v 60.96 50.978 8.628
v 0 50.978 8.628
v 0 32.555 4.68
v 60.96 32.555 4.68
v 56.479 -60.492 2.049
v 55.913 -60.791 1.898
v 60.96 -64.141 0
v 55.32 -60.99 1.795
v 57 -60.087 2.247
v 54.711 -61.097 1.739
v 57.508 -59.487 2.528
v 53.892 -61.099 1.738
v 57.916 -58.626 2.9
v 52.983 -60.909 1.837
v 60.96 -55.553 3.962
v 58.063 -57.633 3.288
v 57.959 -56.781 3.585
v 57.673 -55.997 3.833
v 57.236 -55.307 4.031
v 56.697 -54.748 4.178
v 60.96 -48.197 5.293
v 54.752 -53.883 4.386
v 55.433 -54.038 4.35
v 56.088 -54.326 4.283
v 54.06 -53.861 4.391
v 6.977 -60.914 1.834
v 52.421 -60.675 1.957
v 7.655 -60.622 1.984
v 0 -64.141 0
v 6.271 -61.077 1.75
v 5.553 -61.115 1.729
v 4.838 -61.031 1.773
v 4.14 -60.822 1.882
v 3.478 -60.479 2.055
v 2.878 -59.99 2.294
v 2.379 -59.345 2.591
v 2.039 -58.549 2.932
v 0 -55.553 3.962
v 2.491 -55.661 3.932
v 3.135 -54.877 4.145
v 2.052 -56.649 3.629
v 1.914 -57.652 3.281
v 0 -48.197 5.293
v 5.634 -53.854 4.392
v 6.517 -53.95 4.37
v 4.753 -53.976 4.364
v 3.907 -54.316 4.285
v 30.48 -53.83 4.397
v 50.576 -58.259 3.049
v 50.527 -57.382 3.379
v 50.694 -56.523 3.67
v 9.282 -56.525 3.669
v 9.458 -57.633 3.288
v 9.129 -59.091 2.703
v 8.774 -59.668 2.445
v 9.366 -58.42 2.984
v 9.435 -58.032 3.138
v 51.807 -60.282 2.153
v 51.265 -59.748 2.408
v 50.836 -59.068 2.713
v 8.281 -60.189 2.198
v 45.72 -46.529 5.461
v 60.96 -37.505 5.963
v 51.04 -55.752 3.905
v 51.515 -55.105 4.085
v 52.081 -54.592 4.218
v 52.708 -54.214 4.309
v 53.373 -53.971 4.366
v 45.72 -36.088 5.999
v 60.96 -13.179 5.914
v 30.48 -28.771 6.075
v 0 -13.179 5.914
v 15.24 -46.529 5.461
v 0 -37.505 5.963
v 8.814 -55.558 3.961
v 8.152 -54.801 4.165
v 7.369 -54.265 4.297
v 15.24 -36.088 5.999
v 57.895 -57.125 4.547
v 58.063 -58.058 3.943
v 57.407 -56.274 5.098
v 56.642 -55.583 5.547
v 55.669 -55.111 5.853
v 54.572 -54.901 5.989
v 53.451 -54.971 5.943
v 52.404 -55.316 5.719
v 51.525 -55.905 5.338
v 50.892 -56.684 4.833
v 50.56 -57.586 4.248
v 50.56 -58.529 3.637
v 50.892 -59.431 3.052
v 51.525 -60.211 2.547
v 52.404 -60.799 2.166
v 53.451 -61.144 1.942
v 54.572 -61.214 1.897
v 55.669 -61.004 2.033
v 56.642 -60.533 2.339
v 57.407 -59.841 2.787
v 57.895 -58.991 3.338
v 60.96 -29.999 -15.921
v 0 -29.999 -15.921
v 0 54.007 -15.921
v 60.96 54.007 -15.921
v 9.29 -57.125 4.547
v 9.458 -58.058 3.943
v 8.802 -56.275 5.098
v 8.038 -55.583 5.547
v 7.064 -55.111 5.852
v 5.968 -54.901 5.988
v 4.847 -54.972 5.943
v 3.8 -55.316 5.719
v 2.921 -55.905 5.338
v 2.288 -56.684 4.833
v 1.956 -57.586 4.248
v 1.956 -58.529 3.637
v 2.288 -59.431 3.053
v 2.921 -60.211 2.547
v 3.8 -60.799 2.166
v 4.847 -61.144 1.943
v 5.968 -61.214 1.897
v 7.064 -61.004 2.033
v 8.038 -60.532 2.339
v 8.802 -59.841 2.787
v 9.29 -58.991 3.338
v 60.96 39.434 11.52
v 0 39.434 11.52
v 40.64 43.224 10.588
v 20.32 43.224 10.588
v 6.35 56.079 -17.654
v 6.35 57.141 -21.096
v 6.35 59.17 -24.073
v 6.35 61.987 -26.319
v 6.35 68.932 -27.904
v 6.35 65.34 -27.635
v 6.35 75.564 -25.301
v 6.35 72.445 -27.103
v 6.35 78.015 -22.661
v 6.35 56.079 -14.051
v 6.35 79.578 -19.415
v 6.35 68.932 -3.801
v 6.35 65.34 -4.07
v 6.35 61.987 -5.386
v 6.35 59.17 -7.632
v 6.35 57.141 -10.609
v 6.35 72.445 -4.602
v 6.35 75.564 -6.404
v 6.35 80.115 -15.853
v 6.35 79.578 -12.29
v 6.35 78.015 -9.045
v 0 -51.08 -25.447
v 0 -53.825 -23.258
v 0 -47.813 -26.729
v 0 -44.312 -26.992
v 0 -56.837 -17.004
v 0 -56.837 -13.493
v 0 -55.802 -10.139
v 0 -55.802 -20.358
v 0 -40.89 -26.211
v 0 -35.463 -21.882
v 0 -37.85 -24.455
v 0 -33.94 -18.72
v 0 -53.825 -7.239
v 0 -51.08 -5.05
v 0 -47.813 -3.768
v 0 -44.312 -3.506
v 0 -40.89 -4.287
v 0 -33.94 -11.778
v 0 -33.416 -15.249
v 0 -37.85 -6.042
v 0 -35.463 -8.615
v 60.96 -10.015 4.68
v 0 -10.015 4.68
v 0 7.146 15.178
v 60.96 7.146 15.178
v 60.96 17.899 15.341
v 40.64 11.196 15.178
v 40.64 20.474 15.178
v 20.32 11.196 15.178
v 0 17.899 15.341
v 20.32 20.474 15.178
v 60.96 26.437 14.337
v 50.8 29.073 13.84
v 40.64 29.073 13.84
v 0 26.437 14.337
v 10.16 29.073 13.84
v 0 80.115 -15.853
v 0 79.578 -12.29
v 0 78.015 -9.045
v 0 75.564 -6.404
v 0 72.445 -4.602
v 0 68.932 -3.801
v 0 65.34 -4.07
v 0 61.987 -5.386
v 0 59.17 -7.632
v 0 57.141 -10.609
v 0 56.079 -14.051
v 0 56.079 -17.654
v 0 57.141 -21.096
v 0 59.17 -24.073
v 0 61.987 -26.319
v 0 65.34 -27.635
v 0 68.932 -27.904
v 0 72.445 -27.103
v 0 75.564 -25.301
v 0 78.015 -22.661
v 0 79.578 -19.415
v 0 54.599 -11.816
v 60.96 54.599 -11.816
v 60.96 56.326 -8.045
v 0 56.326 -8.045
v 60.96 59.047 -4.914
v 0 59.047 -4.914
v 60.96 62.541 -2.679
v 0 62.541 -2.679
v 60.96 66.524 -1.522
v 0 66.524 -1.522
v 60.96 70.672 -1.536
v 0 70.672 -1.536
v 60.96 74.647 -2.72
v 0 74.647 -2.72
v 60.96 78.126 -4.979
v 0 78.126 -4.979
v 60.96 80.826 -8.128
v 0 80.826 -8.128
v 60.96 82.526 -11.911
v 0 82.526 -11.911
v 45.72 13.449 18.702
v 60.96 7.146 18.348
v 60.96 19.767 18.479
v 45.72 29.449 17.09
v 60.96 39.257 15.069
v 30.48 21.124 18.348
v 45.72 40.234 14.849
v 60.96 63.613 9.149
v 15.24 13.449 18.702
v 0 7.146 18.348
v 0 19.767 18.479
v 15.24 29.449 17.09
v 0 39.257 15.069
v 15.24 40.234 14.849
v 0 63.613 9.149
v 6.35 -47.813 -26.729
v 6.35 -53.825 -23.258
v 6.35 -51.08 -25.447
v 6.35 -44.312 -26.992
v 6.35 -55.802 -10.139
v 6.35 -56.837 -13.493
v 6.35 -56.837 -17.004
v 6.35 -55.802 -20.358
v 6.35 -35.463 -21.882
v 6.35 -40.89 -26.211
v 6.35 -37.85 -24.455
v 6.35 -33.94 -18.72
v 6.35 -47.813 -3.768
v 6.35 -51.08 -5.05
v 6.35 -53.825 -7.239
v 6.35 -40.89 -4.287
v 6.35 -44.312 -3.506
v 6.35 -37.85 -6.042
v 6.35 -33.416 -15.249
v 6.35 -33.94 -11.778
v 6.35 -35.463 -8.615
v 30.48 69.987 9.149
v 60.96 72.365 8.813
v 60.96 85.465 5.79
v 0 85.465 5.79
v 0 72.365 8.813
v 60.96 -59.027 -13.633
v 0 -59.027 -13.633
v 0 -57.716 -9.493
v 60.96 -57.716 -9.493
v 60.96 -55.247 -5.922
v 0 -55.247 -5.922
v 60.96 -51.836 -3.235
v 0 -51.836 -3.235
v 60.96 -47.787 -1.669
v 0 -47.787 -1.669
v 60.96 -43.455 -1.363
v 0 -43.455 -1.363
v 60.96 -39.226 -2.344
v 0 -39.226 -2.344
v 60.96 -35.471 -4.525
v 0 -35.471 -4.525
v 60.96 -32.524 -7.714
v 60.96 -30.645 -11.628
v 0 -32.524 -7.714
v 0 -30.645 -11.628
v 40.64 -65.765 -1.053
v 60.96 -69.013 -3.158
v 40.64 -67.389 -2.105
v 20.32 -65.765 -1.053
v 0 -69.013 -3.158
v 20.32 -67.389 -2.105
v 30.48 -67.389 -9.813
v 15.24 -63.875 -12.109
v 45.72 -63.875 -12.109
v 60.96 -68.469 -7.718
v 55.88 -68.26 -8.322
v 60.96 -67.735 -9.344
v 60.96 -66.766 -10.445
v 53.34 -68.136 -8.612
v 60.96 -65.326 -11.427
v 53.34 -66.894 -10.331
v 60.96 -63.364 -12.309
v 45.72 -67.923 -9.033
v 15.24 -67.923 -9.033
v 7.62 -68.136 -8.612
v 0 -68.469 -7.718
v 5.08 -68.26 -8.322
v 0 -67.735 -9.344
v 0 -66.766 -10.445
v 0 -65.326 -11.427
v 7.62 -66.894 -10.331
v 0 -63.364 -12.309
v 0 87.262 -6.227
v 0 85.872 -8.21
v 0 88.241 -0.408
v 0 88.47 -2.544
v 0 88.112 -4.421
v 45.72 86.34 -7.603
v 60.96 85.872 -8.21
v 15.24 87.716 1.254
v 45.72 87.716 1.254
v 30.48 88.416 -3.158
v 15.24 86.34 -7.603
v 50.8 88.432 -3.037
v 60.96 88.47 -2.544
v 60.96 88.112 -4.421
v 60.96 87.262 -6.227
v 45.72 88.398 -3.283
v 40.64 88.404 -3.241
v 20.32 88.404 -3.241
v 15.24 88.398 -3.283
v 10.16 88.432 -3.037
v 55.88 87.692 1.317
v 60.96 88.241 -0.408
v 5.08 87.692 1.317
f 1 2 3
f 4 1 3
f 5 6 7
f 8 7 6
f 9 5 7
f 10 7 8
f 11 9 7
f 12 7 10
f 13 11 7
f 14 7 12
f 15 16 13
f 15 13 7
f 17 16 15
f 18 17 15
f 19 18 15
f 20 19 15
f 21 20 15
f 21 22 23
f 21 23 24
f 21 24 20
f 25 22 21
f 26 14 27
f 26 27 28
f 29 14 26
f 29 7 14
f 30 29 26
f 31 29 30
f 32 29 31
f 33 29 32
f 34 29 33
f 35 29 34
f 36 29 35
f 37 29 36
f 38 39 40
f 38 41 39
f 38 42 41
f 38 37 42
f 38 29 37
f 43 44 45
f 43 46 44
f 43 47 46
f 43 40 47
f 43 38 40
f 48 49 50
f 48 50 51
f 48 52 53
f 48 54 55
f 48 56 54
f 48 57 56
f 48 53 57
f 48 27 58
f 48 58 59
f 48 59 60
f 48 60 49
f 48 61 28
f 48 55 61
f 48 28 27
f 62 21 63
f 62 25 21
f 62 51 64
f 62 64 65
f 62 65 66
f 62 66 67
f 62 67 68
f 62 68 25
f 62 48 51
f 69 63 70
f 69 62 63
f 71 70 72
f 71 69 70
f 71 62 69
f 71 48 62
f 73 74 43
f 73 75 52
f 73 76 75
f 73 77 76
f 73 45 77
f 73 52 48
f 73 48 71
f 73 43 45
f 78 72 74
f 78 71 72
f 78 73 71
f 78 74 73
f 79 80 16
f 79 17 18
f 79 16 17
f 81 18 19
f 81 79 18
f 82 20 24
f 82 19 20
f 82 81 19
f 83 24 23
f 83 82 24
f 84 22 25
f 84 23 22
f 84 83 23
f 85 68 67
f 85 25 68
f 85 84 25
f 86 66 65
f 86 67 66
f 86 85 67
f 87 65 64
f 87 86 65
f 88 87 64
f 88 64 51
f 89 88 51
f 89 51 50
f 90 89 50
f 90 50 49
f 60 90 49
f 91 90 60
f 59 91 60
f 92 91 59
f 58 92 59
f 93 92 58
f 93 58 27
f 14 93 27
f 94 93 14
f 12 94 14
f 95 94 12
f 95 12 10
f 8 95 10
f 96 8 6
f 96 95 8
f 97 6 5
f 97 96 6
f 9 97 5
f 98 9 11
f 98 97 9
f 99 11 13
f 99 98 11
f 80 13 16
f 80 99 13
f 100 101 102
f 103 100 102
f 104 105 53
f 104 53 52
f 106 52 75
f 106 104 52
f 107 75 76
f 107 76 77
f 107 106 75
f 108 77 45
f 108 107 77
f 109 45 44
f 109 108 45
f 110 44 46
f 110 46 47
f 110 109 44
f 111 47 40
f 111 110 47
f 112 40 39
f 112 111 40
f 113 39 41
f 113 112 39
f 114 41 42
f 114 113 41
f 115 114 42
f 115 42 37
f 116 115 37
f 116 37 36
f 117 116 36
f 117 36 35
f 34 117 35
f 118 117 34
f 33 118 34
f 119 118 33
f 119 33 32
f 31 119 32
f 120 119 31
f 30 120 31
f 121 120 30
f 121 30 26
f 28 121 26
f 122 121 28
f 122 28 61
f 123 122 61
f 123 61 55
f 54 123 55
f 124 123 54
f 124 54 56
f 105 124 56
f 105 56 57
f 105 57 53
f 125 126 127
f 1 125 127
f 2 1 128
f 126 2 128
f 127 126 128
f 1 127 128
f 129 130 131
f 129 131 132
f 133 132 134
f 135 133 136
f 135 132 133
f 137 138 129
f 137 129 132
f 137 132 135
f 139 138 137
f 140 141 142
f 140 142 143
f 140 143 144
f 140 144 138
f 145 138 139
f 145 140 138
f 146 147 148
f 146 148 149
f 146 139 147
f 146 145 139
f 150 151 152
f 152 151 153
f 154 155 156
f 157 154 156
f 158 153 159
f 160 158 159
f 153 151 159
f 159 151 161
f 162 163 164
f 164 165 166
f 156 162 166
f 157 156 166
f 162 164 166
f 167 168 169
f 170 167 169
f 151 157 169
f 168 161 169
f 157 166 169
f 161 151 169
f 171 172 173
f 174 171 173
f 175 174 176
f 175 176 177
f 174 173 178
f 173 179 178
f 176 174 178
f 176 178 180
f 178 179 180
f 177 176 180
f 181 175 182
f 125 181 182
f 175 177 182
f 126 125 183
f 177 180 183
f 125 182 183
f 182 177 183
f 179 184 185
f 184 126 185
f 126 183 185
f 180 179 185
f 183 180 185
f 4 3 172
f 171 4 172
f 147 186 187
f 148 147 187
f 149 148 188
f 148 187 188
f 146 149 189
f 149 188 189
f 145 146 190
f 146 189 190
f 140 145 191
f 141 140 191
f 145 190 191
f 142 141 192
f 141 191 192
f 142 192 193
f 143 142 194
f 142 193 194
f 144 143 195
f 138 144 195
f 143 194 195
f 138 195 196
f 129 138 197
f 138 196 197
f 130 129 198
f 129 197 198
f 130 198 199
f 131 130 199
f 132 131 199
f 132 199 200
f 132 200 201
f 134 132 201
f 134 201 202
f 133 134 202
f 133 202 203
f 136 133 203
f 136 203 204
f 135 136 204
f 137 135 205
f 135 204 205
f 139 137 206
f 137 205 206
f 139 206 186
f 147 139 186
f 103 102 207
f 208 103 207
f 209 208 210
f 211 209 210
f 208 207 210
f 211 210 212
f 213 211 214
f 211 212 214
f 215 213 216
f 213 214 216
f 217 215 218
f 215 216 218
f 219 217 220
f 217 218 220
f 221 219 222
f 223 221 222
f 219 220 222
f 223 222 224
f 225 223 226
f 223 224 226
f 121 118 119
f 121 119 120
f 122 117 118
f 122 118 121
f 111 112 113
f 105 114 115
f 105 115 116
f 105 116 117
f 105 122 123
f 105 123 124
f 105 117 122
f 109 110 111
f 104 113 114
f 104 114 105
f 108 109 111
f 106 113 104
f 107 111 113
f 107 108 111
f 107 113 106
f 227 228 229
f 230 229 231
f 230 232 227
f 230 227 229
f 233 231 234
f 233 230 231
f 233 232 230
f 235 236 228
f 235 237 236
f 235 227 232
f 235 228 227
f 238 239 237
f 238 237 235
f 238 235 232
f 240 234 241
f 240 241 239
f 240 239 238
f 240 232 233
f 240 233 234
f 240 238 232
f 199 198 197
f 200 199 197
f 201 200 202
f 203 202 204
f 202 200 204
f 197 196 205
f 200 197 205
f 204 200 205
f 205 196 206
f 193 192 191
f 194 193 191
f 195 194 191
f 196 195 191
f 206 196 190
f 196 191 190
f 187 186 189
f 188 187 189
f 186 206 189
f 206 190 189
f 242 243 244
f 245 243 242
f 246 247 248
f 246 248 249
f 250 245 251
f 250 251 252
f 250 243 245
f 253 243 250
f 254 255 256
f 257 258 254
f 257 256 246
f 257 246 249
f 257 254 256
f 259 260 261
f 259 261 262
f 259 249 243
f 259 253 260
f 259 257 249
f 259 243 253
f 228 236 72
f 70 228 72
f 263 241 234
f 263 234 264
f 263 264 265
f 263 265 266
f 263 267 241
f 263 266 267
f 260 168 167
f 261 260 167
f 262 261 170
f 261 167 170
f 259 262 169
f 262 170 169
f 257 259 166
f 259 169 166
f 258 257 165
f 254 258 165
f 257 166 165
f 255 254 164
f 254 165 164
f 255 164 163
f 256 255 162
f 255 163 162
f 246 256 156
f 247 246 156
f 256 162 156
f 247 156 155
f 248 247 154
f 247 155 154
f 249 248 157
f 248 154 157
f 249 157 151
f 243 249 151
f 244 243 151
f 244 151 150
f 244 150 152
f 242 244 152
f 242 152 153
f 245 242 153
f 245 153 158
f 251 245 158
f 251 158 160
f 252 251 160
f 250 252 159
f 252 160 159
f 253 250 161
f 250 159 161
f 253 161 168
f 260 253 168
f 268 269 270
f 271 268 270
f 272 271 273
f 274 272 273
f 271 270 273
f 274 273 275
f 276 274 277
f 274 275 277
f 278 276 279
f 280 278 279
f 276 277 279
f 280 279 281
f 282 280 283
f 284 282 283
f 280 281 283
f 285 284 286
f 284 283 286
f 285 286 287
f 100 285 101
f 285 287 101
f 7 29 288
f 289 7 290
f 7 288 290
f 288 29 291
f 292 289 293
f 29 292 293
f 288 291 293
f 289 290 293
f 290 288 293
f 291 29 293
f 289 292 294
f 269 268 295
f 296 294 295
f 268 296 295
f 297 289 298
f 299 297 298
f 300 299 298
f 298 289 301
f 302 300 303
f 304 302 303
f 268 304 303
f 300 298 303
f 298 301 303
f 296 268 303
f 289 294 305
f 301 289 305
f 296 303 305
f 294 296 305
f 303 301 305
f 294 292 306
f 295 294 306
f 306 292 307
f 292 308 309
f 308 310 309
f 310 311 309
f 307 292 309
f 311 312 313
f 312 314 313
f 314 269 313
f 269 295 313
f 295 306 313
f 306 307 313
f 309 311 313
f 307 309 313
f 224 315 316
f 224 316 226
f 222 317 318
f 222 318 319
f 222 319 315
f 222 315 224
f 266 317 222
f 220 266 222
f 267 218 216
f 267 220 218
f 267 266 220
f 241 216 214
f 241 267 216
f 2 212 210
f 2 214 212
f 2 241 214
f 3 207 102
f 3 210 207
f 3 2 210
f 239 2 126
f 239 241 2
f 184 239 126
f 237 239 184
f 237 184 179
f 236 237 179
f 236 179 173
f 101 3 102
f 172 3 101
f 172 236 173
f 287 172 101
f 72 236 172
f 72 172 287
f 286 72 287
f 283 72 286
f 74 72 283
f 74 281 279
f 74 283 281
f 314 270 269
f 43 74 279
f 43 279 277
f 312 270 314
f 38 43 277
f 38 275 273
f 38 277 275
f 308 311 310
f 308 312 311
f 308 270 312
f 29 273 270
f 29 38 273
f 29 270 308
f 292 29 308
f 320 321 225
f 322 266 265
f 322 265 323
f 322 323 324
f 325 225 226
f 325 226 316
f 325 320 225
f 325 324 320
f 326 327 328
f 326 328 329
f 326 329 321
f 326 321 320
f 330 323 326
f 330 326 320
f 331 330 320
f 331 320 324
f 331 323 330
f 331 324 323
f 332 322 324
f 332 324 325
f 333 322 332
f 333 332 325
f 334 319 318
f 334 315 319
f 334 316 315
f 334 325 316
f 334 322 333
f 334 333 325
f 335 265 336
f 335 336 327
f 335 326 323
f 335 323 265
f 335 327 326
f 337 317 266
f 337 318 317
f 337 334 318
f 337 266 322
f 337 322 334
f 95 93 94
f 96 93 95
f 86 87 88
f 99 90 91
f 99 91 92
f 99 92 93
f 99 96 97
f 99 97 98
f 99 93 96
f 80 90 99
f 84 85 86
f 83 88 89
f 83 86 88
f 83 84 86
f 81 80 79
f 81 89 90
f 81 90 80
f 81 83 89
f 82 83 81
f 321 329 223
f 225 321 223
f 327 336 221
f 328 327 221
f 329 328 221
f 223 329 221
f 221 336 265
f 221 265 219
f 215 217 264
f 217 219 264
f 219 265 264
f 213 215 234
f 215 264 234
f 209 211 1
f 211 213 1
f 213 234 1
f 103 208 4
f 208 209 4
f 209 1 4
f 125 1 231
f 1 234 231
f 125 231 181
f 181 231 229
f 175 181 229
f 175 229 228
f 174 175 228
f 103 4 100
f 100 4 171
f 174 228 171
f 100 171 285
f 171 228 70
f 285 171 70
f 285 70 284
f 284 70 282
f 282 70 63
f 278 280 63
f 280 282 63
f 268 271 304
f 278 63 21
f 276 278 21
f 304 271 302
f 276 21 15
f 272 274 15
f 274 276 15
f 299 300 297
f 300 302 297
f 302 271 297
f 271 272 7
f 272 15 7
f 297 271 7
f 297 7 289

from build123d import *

# Parameters (mm, degrees)
F1_DEPTH = 60.96
F2_R     = 3.7719
F2_R_2   = 3.7723161285
F3_DEPTH = 5.08
F4_R     = 12.0854778756
F5_DEPTH = 6.35
F4_R_2   = 11.7760328576


with BuildPart() as f1:
    # F0 (on Right) → F1 (new body)
    with BuildSketch(Plane.YZ):
        with BuildLine():
            add(Edge.make_bspline(
                [(-64.1409039851, 0), (-61.3367730342, 1.6724076979), (-53.1906836739, 6.5308051097), (-29.0257862813, 6.1581053523), (-13.1791792619, 5.9137001518)],
                knots=[0, 0, 0, 0, 0.3442303205, 1, 1, 1, 1], degree=3))
            add(Edge.make_bspline(
                [(-64.1409039851, 0), (-65.7649742695, -1.0525936291), (-67.3890445539, -2.1051872582), (-69.0131148383, -3.1577808873)],
                knots=[0, 0, 0, 0, 5.8060329598, 5.8060329598, 5.8060329598, 5.8060329598], degree=3))
            add(Edge.make_bspline(
                [(-69.0131148383, -3.1577808873), (-68.9123331399, -5.630824506), (-68.6966685869, -10.9229346325), (-62.4284961999, -12.7148325819), (-59.0266166814, -13.6330034502)],
                knots=[0, 0, 0, 0, 0.4580363137, 0.9801600731, 0.9801600731, 0.9801600731, 0.9801600731], degree=3))
            ThreePointArc((-59.0266166814, -13.6330034502), (-43.4554006161, -1.3628345708), (-29.9993582291, -15.921499941))
            Line((-29.9993582291, -15.921499941), (54.0074083772, -15.921499941))
            ThreePointArc((54.0074083772, -15.921499941), (66.5239810985, -1.5216773113), (82.5264596121, -11.9111029871))
            add(Edge.make_bspline(
                [(85.464653483, 5.7898388273), (87.1383087684, 2.7525841783), (90.5830174187, -3.4986776281), (85.2621277219, -9.0545972271), (82.5264596121, -11.9111029871)],
                knots=[0, 0, 0, 0, 0.4858626535, 1, 1, 1, 1], degree=3))
            add(Edge.make_bspline(
                [(63.6131833576, 9.1485750818), (65.5147638513, 9.2864029295), (70.4140299258, 9.641505067), (79.751431573, 7.2519326646), (85.464653483, 5.7898388273)],
                knots=[0, 0, 0, 0, 0.388135787, 1, 1, 1, 1], degree=3))
            add(Edge.make_bspline(
                [(7.1464148377, 18.3476333366), (11.1956700146, 18.6622120641), (22.3860660817, 19.5315720827), (47.5529559118, 13.1933229182), (63.6131833576, 9.1485750818)],
                knots=[0, 0, 0, 0, 0.3618509258, 1, 1, 1, 1], degree=3))
            Line((7.1464148377, 18.3476333366), (-13.1791792619, 5.9137001518))
        make_face()
        with BuildLine():
            Line((-3.6628949456, -5.7045863252), (-10.0154345855, 4.6798302792))
            Line((-10.0154345855, 4.6798302792), (7.1464148377, 15.1783814167))
            add(Edge.make_bspline(
                [(7.1464148377, 15.1783814167), (8.4105502773, 15.1492259207), (11.5882400934, 15.0759369995), (19.8931919739, 15.9052709485), (32.1324530372, 13.2864391903), (39.4338364298, 11.5199001411)],
                knots=[0, 0, 0, 0, 0.1890527764, 0.4752268335, 0.8221217731, 0.8221217731, 0.8221217731, 0.8221217731], degree=3))
            add(Edge.make_bspline(
                [(39.4338364298, 11.5199001411), (43.1777859172, 10.6140672855), (47.0781263928, 9.6210632321), (50.9784668684, 8.6280591786)],
                knots=[0.8221217731, 0.8221217731, 0.8221217731, 0.8221217731, 1, 1, 1, 1], degree=3))
            Line((50.9784668684, 8.6280591786), (32.5549766421, 4.6798302792))
            add(Edge.make_bspline(
                [(-3.6628949456, -5.7045863252), (-2.9426448667, -6.7081638621), (-0.6801711967, -9.8606352324), (22.1604686278, -12.6179211274), (25.6930435705, -8.1083868826), (29.9163214532, -0.2376900782), (32.5549766421, 4.6798302792)],
                knots=[0, 0, 0, 0, 0.1677344339, 0.5268930214, 0.7044082301, 1, 1, 1, 1], degree=3))
        make_face(mode=Mode.SUBTRACT)
        with BuildLine():
            Line((32.5549766421, 4.6798302792), (-10.0154345855, 4.6798302792))
            Line((-10.0154345855, 4.6798302792), (-3.6628949456, -5.7045863252))
            add(Edge.make_bspline(
                [(-3.6628949456, -5.7045863252), (-2.9426448667, -6.7081638621), (-0.6801711967, -9.8606352324), (22.1604686278, -12.6179211274), (25.6930435705, -8.1083868826), (29.9163214532, -0.2376900782), (32.5549766421, 4.6798302792)],
                knots=[0, 0, 0, 0, 0.1677344339, 0.5268930214, 0.7044082301, 1, 1, 1, 1], degree=3))
        make_face()
    extrude(amount=F1_DEPTH)

    # F2 (on face) → F3 (join)
    with BuildSketch(Plane(origin=(0, -18.9731773498, 29.2741402596), x_dir=(1, 0, 0), z_dir=(0, -0.5438792561, 0.8391634851))):
        with Locations((5.6859576143, -46.5755239129)):
            Circle(F2_R)
        with Locations((54.2904101312, -46.5755239129)):
            Circle(F2_R_2)
    extrude(amount=-F3_DEPTH)


with BuildPart() as f5:
    # F4 (on Right) → F5 (new body)
    with BuildSketch(Plane.YZ):
        with Locations((68.0292993784, -15.8525146544)):
            Circle(F4_R)
    extrude(amount=F5_DEPTH)


with BuildPart() as f5b:
    # F4 (on Right) → F5, piece 2 (new body)
    with BuildSketch(Plane.YZ):
        with Locations((-45.1923944056, -15.248616226)):
            Circle(F4_R_2)
    extrude(amount=F5_DEPTH)


solid = Compound([f1.part, f5.part, f5b.part])
